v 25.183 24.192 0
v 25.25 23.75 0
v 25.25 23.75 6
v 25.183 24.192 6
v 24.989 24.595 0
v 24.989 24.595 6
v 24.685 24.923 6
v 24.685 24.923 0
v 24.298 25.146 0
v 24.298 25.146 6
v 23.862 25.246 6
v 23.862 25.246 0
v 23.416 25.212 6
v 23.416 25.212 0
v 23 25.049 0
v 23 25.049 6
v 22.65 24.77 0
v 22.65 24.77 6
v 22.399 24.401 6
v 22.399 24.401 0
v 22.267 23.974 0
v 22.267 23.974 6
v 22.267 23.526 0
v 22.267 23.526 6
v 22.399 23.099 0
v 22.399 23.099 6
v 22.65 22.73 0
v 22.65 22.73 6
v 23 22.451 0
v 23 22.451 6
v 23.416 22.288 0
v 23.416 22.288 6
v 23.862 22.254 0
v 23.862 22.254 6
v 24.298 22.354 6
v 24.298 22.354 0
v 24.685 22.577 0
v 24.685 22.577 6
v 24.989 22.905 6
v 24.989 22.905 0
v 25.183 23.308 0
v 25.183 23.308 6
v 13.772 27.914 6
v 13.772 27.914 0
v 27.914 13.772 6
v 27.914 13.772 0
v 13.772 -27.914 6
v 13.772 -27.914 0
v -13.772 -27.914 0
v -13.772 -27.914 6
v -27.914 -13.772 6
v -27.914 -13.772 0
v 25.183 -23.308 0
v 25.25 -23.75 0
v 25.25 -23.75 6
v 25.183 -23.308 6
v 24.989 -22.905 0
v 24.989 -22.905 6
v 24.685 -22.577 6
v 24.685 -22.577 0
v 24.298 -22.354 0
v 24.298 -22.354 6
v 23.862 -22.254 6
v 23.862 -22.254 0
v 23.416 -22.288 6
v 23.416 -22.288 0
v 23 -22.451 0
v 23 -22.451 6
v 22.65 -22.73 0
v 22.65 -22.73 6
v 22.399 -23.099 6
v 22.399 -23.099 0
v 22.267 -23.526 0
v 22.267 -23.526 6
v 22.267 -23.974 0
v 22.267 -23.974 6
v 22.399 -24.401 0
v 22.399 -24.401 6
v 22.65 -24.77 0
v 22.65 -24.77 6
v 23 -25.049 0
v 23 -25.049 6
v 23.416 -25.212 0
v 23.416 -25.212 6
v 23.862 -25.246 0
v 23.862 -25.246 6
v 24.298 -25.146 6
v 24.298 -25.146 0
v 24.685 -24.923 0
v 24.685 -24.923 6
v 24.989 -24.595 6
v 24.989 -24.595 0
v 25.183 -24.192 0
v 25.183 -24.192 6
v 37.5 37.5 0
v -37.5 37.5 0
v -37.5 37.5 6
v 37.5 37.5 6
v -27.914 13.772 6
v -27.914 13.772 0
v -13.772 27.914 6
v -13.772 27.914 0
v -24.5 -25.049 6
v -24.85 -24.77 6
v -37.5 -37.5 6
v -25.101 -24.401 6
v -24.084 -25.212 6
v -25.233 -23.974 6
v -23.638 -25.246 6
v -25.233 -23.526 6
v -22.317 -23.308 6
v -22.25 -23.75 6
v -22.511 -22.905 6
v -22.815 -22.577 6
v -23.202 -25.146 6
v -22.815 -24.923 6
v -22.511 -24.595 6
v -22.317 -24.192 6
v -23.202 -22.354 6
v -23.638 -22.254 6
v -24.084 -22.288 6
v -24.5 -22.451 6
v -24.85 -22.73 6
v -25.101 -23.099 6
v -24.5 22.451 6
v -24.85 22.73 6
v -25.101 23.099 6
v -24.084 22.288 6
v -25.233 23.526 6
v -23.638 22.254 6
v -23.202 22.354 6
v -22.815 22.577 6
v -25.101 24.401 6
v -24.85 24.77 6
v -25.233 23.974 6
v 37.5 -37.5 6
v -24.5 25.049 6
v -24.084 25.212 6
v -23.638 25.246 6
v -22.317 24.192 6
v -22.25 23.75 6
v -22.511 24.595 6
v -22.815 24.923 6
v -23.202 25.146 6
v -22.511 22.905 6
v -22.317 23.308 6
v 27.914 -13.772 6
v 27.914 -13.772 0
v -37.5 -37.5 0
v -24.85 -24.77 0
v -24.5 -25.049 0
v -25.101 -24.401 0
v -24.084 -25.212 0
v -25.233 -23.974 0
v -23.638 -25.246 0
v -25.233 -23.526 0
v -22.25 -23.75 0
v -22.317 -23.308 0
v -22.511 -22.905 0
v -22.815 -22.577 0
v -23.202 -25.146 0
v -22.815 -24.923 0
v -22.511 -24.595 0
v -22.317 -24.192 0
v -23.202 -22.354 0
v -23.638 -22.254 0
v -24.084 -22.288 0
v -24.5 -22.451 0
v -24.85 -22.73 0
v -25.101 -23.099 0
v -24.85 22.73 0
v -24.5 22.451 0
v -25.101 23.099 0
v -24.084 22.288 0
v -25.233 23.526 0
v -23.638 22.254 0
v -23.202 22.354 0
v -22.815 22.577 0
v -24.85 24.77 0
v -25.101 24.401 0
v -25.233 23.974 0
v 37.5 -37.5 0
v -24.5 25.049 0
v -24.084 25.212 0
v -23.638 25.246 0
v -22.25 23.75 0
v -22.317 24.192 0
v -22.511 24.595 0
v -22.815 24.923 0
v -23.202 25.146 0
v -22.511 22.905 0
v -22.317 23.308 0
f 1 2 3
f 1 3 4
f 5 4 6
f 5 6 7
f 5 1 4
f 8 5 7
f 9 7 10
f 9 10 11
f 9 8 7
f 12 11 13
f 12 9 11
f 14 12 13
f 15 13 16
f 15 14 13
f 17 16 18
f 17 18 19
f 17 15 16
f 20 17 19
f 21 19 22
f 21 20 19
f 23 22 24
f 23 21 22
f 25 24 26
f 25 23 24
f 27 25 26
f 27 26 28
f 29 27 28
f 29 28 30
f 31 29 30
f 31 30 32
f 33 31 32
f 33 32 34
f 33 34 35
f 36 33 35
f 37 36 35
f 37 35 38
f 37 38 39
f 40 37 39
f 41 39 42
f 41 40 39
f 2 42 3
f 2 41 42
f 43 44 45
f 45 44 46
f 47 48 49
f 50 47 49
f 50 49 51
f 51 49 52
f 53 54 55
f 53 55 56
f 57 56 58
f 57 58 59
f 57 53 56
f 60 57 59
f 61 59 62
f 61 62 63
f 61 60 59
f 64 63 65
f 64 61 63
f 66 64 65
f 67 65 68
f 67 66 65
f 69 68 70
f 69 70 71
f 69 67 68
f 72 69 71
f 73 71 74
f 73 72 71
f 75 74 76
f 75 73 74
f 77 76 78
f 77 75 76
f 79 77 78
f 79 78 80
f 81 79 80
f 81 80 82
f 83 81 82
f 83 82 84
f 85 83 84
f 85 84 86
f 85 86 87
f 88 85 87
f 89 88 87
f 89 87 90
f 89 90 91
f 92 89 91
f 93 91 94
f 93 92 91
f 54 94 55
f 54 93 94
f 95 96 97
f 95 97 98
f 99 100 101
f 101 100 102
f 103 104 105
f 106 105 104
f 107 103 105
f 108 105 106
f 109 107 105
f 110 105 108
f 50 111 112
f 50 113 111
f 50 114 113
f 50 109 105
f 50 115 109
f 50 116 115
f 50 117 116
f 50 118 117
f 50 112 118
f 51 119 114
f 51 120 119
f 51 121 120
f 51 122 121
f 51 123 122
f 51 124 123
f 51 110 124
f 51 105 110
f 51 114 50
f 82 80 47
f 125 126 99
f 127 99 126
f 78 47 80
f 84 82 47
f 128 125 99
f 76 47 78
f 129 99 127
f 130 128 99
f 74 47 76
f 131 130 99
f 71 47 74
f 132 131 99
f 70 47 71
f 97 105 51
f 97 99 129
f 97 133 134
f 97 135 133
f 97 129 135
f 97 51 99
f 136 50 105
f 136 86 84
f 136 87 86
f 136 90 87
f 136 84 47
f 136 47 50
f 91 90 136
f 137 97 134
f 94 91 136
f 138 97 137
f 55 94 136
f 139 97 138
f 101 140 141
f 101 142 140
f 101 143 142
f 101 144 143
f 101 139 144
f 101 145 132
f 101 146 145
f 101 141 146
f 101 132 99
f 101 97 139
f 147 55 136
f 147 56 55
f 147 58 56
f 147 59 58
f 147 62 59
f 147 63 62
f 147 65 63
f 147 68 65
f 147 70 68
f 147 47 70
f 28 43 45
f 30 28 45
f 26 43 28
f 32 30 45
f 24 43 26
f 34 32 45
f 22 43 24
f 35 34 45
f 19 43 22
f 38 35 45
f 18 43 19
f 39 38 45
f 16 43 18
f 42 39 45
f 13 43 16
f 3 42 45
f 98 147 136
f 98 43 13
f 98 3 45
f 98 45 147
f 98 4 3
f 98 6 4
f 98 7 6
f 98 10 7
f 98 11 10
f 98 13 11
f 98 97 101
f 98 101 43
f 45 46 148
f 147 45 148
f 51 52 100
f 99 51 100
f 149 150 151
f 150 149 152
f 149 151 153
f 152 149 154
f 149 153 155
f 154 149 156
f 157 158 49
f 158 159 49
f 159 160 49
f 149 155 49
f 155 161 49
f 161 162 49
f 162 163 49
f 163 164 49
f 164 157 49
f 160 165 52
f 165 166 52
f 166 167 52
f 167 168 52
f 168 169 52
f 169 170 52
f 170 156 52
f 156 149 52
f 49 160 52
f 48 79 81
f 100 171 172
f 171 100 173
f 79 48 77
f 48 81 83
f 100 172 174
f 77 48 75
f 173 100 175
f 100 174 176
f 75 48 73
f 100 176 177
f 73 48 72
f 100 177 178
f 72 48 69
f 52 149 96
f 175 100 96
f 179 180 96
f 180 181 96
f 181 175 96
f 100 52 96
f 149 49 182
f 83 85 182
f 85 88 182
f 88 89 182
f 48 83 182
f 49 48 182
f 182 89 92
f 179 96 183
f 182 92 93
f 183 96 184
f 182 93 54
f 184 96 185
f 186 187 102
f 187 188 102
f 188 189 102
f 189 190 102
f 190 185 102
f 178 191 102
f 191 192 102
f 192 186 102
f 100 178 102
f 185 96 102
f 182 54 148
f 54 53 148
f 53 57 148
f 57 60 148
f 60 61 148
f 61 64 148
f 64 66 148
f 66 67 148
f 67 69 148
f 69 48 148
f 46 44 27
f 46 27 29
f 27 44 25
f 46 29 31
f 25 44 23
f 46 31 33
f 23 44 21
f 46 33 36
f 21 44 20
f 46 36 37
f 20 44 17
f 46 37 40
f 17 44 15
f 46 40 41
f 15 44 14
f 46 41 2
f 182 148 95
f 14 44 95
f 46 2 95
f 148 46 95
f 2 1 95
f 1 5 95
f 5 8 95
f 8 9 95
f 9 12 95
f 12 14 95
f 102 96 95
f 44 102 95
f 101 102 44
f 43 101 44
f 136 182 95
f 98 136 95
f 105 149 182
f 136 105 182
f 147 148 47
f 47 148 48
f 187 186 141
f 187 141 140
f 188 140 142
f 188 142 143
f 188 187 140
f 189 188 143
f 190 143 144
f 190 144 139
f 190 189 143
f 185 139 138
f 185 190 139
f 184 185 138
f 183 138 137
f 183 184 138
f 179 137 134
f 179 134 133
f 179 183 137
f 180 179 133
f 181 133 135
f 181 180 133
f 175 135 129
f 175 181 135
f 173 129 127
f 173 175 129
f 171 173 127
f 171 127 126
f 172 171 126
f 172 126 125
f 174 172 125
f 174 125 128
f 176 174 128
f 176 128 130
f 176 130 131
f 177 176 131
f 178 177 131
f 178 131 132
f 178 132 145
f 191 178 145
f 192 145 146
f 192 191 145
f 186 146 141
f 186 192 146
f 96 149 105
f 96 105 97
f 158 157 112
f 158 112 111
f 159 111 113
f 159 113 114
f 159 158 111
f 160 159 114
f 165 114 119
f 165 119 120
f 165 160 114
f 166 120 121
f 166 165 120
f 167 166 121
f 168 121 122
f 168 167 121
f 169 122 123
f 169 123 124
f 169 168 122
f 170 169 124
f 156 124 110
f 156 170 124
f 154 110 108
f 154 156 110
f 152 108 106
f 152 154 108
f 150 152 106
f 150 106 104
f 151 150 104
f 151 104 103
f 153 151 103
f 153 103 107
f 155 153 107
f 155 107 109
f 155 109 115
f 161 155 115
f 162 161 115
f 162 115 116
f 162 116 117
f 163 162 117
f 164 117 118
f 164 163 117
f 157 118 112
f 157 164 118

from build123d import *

# Parameters (mm, degrees)
SKETCH1_W           = 75
SKETCH1_H           = 75
SKETCH1_R           = 1.5
BOSS_EXTRUDE1_DEPTH = 6


with BuildPart() as part:
    # Sketch1 → Boss-Extrude1 (new body)
    with BuildSketch(Plane.XY):
        Rectangle(SKETCH1_W, SKETCH1_H)
        with Locations((-23.75, 23.75)):
            Circle(SKETCH1_R, mode=Mode.SUBTRACT)
        with Locations((23.75, 23.75)):
            Circle(SKETCH1_R, mode=Mode.SUBTRACT)
        with Locations((23.75, -23.75)):
            Circle(SKETCH1_R, mode=Mode.SUBTRACT)
        with Locations((-23.75, -23.75)):
            Circle(SKETCH1_R, mode=Mode.SUBTRACT)
        Polygon((-27.914213562, 13.772077939), (-13.772077939, 27.914213562), (13.772077939, 27.914213562), (27.914213562, 13.772077939), (27.914213562, -13.772077939), (13.772077939, -27.914213562), (-13.772077939, -27.914213562), (-27.914213562, -13.772077939), align=None, mode=Mode.SUBTRACT)
    extrude(amount=BOSS_EXTRUDE1_DEPTH)


solid = part.part
